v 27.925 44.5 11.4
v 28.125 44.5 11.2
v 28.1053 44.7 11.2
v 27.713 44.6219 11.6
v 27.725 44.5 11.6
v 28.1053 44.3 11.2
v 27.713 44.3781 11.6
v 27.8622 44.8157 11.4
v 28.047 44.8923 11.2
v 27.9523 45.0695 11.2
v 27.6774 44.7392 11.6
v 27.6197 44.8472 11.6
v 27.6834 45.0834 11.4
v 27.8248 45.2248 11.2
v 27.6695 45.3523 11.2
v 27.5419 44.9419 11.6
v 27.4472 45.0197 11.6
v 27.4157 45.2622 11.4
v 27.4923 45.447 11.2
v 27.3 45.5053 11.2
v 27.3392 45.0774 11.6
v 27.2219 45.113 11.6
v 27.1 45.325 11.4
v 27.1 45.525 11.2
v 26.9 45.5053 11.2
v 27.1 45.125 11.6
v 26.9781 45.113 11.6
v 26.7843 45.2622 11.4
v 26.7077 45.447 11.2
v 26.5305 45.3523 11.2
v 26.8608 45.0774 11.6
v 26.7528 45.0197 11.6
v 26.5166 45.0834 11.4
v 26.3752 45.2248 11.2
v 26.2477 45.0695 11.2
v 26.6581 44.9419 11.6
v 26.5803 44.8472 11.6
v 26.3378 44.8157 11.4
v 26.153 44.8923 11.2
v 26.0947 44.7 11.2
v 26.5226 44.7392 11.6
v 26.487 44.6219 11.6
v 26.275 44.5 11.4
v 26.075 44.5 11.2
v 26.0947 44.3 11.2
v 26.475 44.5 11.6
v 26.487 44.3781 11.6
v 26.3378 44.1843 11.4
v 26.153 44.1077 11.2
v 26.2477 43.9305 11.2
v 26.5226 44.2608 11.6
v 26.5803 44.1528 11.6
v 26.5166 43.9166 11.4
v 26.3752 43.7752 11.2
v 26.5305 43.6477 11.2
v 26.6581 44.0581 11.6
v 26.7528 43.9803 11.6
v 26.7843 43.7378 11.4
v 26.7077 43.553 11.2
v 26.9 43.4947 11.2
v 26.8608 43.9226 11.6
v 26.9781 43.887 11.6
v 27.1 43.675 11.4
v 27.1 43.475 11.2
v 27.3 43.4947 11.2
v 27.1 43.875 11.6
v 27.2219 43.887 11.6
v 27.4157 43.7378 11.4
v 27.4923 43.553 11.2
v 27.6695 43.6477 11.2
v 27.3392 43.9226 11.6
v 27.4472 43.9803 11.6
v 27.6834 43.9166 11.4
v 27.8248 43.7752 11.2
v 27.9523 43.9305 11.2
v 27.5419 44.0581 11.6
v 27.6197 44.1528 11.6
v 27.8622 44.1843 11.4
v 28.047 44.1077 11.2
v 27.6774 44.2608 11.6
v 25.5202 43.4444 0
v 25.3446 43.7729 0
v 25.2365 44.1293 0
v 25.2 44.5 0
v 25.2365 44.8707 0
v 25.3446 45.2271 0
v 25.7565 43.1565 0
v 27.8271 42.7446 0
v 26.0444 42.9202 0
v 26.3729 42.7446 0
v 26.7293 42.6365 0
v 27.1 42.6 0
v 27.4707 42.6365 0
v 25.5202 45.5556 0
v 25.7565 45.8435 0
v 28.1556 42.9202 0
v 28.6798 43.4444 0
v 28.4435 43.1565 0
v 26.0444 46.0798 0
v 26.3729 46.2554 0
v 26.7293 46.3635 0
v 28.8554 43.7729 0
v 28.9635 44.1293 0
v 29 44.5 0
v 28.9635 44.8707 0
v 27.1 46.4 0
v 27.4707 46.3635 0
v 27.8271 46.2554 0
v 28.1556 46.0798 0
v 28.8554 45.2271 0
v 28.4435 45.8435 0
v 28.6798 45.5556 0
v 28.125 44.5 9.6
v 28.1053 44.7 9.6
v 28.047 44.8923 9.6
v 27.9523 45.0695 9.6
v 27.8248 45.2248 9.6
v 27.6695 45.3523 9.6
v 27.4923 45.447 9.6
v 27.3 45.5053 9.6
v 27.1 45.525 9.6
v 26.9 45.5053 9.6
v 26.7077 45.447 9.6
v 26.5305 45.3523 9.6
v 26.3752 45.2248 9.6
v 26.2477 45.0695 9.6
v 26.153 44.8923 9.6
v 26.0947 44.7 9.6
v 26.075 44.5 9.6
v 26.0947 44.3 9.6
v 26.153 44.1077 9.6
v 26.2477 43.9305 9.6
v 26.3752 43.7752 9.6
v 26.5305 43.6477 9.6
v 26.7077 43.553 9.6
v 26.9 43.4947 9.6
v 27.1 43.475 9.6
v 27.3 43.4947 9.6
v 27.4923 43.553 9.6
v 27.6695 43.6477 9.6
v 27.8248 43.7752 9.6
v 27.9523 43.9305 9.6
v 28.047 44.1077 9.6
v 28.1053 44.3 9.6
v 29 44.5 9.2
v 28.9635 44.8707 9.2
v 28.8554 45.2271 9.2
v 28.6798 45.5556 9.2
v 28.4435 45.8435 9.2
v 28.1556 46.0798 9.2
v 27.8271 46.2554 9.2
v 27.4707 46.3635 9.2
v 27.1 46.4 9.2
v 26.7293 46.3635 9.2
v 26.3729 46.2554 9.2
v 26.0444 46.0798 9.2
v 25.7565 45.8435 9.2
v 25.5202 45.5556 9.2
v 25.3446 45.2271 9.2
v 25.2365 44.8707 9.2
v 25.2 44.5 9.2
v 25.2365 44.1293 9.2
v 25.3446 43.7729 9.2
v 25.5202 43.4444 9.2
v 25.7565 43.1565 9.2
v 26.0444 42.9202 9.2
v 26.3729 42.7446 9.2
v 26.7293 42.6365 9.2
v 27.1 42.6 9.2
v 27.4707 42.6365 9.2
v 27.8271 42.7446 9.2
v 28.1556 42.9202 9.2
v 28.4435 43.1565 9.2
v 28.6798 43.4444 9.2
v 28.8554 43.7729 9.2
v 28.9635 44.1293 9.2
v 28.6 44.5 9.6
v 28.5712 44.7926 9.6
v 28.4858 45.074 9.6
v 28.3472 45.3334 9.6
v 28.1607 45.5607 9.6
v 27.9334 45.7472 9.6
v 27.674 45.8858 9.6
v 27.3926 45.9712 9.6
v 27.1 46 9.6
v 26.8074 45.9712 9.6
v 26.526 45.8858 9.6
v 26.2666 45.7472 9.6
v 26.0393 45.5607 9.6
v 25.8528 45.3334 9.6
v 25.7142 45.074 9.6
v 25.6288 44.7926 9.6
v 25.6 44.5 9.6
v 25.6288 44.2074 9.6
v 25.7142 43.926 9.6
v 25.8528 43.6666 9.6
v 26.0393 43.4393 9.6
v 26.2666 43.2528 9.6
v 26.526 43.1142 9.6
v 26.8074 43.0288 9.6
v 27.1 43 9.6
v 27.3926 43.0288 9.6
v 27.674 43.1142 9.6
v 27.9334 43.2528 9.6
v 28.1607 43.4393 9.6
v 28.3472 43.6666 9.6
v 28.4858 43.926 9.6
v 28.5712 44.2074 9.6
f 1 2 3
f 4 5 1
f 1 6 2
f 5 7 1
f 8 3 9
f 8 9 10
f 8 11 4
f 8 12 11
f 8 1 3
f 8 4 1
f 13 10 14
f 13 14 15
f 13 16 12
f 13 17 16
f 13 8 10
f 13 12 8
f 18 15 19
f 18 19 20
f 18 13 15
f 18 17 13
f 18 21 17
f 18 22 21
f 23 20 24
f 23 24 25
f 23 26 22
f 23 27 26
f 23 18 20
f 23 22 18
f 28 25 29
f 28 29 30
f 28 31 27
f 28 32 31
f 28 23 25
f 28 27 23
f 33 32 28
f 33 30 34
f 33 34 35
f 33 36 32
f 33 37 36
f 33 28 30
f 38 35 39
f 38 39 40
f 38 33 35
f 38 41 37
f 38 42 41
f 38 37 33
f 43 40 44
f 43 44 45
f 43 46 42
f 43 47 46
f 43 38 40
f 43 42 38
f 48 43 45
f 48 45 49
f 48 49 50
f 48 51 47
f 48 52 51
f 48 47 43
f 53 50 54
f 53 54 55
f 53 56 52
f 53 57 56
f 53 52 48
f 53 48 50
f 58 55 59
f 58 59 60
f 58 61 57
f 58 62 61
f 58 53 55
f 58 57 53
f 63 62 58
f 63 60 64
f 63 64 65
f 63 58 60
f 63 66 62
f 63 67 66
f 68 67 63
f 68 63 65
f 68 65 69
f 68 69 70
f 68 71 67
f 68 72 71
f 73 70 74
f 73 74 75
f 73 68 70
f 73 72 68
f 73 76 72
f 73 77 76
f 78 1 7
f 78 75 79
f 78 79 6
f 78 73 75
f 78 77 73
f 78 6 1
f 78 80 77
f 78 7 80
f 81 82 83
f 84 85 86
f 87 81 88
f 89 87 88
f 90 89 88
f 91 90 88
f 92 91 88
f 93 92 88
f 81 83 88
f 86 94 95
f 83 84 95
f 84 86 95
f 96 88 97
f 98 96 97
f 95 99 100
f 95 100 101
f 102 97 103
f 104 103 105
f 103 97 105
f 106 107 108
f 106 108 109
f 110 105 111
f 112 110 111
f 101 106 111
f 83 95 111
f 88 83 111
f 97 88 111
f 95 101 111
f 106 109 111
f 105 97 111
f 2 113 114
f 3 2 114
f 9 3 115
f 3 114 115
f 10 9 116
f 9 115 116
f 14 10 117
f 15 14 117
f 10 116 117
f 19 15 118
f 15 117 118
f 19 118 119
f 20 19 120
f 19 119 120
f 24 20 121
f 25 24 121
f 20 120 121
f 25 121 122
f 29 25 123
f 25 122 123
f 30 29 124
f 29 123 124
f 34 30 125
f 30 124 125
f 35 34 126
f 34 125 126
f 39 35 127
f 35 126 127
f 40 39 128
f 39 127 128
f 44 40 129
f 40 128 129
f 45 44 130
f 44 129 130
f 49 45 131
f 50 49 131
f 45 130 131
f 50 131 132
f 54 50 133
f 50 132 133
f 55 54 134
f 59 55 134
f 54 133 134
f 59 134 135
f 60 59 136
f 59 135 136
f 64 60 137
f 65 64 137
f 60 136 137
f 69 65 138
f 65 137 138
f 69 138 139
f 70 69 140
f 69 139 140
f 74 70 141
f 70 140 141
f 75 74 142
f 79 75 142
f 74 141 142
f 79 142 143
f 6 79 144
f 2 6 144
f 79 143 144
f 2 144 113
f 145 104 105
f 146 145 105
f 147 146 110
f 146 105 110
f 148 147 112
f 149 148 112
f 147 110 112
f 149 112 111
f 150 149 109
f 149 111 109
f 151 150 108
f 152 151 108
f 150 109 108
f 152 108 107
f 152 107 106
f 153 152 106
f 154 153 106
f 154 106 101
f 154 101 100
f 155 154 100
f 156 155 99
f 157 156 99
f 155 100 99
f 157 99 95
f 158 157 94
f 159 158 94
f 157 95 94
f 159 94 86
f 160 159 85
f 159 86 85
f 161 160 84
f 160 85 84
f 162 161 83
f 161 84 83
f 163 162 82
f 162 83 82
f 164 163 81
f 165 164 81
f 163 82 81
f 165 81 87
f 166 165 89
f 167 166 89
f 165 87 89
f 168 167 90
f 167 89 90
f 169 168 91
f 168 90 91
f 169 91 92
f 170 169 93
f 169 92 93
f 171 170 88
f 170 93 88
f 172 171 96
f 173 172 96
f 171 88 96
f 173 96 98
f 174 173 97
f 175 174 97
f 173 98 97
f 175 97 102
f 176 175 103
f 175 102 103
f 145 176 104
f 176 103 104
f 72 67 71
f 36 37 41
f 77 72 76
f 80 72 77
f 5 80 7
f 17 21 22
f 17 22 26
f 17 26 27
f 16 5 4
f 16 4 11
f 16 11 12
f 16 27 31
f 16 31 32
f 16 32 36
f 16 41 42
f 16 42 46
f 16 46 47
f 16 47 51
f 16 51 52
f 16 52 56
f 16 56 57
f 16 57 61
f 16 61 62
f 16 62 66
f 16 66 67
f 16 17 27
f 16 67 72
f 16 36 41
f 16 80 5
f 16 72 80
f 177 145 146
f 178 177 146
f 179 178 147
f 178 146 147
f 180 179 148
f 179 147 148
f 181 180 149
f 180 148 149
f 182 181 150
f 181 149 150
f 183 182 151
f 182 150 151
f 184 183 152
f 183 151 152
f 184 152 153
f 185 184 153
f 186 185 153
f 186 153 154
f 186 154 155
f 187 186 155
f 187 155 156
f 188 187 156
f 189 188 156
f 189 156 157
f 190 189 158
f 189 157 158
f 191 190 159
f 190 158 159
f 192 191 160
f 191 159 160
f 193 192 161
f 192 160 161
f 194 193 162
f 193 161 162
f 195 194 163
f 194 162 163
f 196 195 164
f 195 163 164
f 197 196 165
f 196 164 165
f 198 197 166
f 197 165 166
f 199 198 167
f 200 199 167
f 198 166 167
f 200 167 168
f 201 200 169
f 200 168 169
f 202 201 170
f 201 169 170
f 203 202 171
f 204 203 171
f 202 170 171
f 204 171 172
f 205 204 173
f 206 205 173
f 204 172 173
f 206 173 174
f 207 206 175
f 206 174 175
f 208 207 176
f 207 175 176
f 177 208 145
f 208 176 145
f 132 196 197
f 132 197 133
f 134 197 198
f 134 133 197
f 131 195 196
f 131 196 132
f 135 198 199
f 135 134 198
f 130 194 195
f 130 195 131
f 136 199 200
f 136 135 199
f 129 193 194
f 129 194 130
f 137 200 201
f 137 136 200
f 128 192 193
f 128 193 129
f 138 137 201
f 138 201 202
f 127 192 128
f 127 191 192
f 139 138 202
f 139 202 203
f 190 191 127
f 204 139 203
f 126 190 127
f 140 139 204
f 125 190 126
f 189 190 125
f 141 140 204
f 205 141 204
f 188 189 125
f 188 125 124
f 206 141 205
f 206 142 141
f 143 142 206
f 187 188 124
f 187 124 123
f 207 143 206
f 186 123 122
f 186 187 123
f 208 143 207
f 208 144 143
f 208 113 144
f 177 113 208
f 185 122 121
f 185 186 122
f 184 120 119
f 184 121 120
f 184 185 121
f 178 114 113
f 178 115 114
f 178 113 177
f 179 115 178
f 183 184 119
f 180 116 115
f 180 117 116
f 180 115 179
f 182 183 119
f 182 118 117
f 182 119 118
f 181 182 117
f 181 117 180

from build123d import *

# Parameters (mm, degrees)
SKETCH012_R     = 1.9
PAD005_DEPTH    = 9.6
SKETCH013_R     = 1.025
PAD006_DEPTH    = 2
CHAMFER002_SIZE = 0.4
CHAMFER003_SIZE = 0.4


with BuildPart() as part:
    # Sketch012 → Pad005 (new body)
    with BuildSketch(Plane.XY):
        Circle(SKETCH012_R)
    extrude(amount=PAD005_DEPTH)

    # Sketch013 (on Face3 of Pad005) → Pad006 (join)
    with BuildSketch(Plane.XY.offset(9.6)):
        Circle(SKETCH013_R)
    extrude(amount=PAD006_DEPTH)

    # Chamfer002
    chamfer002_edges = [part.edges().sort_by_distance(p)[0] for p in [
        (-1.025, 0, 11.6),
    ]]
    chamfer(chamfer002_edges, length=CHAMFER002_SIZE)

    # Chamfer003
    chamfer003_edges = [part.edges().sort_by_distance(p)[0] for p in [
        (-1.9, 0, 9.6),
    ]]
    chamfer(chamfer003_edges, length=CHAMFER003_SIZE)


with BuildPart() as part_1:
    # Body002 placement: moved
    add(part.part.moved(Location((27.1, 44.5, 0))))


solid = part_1.part
